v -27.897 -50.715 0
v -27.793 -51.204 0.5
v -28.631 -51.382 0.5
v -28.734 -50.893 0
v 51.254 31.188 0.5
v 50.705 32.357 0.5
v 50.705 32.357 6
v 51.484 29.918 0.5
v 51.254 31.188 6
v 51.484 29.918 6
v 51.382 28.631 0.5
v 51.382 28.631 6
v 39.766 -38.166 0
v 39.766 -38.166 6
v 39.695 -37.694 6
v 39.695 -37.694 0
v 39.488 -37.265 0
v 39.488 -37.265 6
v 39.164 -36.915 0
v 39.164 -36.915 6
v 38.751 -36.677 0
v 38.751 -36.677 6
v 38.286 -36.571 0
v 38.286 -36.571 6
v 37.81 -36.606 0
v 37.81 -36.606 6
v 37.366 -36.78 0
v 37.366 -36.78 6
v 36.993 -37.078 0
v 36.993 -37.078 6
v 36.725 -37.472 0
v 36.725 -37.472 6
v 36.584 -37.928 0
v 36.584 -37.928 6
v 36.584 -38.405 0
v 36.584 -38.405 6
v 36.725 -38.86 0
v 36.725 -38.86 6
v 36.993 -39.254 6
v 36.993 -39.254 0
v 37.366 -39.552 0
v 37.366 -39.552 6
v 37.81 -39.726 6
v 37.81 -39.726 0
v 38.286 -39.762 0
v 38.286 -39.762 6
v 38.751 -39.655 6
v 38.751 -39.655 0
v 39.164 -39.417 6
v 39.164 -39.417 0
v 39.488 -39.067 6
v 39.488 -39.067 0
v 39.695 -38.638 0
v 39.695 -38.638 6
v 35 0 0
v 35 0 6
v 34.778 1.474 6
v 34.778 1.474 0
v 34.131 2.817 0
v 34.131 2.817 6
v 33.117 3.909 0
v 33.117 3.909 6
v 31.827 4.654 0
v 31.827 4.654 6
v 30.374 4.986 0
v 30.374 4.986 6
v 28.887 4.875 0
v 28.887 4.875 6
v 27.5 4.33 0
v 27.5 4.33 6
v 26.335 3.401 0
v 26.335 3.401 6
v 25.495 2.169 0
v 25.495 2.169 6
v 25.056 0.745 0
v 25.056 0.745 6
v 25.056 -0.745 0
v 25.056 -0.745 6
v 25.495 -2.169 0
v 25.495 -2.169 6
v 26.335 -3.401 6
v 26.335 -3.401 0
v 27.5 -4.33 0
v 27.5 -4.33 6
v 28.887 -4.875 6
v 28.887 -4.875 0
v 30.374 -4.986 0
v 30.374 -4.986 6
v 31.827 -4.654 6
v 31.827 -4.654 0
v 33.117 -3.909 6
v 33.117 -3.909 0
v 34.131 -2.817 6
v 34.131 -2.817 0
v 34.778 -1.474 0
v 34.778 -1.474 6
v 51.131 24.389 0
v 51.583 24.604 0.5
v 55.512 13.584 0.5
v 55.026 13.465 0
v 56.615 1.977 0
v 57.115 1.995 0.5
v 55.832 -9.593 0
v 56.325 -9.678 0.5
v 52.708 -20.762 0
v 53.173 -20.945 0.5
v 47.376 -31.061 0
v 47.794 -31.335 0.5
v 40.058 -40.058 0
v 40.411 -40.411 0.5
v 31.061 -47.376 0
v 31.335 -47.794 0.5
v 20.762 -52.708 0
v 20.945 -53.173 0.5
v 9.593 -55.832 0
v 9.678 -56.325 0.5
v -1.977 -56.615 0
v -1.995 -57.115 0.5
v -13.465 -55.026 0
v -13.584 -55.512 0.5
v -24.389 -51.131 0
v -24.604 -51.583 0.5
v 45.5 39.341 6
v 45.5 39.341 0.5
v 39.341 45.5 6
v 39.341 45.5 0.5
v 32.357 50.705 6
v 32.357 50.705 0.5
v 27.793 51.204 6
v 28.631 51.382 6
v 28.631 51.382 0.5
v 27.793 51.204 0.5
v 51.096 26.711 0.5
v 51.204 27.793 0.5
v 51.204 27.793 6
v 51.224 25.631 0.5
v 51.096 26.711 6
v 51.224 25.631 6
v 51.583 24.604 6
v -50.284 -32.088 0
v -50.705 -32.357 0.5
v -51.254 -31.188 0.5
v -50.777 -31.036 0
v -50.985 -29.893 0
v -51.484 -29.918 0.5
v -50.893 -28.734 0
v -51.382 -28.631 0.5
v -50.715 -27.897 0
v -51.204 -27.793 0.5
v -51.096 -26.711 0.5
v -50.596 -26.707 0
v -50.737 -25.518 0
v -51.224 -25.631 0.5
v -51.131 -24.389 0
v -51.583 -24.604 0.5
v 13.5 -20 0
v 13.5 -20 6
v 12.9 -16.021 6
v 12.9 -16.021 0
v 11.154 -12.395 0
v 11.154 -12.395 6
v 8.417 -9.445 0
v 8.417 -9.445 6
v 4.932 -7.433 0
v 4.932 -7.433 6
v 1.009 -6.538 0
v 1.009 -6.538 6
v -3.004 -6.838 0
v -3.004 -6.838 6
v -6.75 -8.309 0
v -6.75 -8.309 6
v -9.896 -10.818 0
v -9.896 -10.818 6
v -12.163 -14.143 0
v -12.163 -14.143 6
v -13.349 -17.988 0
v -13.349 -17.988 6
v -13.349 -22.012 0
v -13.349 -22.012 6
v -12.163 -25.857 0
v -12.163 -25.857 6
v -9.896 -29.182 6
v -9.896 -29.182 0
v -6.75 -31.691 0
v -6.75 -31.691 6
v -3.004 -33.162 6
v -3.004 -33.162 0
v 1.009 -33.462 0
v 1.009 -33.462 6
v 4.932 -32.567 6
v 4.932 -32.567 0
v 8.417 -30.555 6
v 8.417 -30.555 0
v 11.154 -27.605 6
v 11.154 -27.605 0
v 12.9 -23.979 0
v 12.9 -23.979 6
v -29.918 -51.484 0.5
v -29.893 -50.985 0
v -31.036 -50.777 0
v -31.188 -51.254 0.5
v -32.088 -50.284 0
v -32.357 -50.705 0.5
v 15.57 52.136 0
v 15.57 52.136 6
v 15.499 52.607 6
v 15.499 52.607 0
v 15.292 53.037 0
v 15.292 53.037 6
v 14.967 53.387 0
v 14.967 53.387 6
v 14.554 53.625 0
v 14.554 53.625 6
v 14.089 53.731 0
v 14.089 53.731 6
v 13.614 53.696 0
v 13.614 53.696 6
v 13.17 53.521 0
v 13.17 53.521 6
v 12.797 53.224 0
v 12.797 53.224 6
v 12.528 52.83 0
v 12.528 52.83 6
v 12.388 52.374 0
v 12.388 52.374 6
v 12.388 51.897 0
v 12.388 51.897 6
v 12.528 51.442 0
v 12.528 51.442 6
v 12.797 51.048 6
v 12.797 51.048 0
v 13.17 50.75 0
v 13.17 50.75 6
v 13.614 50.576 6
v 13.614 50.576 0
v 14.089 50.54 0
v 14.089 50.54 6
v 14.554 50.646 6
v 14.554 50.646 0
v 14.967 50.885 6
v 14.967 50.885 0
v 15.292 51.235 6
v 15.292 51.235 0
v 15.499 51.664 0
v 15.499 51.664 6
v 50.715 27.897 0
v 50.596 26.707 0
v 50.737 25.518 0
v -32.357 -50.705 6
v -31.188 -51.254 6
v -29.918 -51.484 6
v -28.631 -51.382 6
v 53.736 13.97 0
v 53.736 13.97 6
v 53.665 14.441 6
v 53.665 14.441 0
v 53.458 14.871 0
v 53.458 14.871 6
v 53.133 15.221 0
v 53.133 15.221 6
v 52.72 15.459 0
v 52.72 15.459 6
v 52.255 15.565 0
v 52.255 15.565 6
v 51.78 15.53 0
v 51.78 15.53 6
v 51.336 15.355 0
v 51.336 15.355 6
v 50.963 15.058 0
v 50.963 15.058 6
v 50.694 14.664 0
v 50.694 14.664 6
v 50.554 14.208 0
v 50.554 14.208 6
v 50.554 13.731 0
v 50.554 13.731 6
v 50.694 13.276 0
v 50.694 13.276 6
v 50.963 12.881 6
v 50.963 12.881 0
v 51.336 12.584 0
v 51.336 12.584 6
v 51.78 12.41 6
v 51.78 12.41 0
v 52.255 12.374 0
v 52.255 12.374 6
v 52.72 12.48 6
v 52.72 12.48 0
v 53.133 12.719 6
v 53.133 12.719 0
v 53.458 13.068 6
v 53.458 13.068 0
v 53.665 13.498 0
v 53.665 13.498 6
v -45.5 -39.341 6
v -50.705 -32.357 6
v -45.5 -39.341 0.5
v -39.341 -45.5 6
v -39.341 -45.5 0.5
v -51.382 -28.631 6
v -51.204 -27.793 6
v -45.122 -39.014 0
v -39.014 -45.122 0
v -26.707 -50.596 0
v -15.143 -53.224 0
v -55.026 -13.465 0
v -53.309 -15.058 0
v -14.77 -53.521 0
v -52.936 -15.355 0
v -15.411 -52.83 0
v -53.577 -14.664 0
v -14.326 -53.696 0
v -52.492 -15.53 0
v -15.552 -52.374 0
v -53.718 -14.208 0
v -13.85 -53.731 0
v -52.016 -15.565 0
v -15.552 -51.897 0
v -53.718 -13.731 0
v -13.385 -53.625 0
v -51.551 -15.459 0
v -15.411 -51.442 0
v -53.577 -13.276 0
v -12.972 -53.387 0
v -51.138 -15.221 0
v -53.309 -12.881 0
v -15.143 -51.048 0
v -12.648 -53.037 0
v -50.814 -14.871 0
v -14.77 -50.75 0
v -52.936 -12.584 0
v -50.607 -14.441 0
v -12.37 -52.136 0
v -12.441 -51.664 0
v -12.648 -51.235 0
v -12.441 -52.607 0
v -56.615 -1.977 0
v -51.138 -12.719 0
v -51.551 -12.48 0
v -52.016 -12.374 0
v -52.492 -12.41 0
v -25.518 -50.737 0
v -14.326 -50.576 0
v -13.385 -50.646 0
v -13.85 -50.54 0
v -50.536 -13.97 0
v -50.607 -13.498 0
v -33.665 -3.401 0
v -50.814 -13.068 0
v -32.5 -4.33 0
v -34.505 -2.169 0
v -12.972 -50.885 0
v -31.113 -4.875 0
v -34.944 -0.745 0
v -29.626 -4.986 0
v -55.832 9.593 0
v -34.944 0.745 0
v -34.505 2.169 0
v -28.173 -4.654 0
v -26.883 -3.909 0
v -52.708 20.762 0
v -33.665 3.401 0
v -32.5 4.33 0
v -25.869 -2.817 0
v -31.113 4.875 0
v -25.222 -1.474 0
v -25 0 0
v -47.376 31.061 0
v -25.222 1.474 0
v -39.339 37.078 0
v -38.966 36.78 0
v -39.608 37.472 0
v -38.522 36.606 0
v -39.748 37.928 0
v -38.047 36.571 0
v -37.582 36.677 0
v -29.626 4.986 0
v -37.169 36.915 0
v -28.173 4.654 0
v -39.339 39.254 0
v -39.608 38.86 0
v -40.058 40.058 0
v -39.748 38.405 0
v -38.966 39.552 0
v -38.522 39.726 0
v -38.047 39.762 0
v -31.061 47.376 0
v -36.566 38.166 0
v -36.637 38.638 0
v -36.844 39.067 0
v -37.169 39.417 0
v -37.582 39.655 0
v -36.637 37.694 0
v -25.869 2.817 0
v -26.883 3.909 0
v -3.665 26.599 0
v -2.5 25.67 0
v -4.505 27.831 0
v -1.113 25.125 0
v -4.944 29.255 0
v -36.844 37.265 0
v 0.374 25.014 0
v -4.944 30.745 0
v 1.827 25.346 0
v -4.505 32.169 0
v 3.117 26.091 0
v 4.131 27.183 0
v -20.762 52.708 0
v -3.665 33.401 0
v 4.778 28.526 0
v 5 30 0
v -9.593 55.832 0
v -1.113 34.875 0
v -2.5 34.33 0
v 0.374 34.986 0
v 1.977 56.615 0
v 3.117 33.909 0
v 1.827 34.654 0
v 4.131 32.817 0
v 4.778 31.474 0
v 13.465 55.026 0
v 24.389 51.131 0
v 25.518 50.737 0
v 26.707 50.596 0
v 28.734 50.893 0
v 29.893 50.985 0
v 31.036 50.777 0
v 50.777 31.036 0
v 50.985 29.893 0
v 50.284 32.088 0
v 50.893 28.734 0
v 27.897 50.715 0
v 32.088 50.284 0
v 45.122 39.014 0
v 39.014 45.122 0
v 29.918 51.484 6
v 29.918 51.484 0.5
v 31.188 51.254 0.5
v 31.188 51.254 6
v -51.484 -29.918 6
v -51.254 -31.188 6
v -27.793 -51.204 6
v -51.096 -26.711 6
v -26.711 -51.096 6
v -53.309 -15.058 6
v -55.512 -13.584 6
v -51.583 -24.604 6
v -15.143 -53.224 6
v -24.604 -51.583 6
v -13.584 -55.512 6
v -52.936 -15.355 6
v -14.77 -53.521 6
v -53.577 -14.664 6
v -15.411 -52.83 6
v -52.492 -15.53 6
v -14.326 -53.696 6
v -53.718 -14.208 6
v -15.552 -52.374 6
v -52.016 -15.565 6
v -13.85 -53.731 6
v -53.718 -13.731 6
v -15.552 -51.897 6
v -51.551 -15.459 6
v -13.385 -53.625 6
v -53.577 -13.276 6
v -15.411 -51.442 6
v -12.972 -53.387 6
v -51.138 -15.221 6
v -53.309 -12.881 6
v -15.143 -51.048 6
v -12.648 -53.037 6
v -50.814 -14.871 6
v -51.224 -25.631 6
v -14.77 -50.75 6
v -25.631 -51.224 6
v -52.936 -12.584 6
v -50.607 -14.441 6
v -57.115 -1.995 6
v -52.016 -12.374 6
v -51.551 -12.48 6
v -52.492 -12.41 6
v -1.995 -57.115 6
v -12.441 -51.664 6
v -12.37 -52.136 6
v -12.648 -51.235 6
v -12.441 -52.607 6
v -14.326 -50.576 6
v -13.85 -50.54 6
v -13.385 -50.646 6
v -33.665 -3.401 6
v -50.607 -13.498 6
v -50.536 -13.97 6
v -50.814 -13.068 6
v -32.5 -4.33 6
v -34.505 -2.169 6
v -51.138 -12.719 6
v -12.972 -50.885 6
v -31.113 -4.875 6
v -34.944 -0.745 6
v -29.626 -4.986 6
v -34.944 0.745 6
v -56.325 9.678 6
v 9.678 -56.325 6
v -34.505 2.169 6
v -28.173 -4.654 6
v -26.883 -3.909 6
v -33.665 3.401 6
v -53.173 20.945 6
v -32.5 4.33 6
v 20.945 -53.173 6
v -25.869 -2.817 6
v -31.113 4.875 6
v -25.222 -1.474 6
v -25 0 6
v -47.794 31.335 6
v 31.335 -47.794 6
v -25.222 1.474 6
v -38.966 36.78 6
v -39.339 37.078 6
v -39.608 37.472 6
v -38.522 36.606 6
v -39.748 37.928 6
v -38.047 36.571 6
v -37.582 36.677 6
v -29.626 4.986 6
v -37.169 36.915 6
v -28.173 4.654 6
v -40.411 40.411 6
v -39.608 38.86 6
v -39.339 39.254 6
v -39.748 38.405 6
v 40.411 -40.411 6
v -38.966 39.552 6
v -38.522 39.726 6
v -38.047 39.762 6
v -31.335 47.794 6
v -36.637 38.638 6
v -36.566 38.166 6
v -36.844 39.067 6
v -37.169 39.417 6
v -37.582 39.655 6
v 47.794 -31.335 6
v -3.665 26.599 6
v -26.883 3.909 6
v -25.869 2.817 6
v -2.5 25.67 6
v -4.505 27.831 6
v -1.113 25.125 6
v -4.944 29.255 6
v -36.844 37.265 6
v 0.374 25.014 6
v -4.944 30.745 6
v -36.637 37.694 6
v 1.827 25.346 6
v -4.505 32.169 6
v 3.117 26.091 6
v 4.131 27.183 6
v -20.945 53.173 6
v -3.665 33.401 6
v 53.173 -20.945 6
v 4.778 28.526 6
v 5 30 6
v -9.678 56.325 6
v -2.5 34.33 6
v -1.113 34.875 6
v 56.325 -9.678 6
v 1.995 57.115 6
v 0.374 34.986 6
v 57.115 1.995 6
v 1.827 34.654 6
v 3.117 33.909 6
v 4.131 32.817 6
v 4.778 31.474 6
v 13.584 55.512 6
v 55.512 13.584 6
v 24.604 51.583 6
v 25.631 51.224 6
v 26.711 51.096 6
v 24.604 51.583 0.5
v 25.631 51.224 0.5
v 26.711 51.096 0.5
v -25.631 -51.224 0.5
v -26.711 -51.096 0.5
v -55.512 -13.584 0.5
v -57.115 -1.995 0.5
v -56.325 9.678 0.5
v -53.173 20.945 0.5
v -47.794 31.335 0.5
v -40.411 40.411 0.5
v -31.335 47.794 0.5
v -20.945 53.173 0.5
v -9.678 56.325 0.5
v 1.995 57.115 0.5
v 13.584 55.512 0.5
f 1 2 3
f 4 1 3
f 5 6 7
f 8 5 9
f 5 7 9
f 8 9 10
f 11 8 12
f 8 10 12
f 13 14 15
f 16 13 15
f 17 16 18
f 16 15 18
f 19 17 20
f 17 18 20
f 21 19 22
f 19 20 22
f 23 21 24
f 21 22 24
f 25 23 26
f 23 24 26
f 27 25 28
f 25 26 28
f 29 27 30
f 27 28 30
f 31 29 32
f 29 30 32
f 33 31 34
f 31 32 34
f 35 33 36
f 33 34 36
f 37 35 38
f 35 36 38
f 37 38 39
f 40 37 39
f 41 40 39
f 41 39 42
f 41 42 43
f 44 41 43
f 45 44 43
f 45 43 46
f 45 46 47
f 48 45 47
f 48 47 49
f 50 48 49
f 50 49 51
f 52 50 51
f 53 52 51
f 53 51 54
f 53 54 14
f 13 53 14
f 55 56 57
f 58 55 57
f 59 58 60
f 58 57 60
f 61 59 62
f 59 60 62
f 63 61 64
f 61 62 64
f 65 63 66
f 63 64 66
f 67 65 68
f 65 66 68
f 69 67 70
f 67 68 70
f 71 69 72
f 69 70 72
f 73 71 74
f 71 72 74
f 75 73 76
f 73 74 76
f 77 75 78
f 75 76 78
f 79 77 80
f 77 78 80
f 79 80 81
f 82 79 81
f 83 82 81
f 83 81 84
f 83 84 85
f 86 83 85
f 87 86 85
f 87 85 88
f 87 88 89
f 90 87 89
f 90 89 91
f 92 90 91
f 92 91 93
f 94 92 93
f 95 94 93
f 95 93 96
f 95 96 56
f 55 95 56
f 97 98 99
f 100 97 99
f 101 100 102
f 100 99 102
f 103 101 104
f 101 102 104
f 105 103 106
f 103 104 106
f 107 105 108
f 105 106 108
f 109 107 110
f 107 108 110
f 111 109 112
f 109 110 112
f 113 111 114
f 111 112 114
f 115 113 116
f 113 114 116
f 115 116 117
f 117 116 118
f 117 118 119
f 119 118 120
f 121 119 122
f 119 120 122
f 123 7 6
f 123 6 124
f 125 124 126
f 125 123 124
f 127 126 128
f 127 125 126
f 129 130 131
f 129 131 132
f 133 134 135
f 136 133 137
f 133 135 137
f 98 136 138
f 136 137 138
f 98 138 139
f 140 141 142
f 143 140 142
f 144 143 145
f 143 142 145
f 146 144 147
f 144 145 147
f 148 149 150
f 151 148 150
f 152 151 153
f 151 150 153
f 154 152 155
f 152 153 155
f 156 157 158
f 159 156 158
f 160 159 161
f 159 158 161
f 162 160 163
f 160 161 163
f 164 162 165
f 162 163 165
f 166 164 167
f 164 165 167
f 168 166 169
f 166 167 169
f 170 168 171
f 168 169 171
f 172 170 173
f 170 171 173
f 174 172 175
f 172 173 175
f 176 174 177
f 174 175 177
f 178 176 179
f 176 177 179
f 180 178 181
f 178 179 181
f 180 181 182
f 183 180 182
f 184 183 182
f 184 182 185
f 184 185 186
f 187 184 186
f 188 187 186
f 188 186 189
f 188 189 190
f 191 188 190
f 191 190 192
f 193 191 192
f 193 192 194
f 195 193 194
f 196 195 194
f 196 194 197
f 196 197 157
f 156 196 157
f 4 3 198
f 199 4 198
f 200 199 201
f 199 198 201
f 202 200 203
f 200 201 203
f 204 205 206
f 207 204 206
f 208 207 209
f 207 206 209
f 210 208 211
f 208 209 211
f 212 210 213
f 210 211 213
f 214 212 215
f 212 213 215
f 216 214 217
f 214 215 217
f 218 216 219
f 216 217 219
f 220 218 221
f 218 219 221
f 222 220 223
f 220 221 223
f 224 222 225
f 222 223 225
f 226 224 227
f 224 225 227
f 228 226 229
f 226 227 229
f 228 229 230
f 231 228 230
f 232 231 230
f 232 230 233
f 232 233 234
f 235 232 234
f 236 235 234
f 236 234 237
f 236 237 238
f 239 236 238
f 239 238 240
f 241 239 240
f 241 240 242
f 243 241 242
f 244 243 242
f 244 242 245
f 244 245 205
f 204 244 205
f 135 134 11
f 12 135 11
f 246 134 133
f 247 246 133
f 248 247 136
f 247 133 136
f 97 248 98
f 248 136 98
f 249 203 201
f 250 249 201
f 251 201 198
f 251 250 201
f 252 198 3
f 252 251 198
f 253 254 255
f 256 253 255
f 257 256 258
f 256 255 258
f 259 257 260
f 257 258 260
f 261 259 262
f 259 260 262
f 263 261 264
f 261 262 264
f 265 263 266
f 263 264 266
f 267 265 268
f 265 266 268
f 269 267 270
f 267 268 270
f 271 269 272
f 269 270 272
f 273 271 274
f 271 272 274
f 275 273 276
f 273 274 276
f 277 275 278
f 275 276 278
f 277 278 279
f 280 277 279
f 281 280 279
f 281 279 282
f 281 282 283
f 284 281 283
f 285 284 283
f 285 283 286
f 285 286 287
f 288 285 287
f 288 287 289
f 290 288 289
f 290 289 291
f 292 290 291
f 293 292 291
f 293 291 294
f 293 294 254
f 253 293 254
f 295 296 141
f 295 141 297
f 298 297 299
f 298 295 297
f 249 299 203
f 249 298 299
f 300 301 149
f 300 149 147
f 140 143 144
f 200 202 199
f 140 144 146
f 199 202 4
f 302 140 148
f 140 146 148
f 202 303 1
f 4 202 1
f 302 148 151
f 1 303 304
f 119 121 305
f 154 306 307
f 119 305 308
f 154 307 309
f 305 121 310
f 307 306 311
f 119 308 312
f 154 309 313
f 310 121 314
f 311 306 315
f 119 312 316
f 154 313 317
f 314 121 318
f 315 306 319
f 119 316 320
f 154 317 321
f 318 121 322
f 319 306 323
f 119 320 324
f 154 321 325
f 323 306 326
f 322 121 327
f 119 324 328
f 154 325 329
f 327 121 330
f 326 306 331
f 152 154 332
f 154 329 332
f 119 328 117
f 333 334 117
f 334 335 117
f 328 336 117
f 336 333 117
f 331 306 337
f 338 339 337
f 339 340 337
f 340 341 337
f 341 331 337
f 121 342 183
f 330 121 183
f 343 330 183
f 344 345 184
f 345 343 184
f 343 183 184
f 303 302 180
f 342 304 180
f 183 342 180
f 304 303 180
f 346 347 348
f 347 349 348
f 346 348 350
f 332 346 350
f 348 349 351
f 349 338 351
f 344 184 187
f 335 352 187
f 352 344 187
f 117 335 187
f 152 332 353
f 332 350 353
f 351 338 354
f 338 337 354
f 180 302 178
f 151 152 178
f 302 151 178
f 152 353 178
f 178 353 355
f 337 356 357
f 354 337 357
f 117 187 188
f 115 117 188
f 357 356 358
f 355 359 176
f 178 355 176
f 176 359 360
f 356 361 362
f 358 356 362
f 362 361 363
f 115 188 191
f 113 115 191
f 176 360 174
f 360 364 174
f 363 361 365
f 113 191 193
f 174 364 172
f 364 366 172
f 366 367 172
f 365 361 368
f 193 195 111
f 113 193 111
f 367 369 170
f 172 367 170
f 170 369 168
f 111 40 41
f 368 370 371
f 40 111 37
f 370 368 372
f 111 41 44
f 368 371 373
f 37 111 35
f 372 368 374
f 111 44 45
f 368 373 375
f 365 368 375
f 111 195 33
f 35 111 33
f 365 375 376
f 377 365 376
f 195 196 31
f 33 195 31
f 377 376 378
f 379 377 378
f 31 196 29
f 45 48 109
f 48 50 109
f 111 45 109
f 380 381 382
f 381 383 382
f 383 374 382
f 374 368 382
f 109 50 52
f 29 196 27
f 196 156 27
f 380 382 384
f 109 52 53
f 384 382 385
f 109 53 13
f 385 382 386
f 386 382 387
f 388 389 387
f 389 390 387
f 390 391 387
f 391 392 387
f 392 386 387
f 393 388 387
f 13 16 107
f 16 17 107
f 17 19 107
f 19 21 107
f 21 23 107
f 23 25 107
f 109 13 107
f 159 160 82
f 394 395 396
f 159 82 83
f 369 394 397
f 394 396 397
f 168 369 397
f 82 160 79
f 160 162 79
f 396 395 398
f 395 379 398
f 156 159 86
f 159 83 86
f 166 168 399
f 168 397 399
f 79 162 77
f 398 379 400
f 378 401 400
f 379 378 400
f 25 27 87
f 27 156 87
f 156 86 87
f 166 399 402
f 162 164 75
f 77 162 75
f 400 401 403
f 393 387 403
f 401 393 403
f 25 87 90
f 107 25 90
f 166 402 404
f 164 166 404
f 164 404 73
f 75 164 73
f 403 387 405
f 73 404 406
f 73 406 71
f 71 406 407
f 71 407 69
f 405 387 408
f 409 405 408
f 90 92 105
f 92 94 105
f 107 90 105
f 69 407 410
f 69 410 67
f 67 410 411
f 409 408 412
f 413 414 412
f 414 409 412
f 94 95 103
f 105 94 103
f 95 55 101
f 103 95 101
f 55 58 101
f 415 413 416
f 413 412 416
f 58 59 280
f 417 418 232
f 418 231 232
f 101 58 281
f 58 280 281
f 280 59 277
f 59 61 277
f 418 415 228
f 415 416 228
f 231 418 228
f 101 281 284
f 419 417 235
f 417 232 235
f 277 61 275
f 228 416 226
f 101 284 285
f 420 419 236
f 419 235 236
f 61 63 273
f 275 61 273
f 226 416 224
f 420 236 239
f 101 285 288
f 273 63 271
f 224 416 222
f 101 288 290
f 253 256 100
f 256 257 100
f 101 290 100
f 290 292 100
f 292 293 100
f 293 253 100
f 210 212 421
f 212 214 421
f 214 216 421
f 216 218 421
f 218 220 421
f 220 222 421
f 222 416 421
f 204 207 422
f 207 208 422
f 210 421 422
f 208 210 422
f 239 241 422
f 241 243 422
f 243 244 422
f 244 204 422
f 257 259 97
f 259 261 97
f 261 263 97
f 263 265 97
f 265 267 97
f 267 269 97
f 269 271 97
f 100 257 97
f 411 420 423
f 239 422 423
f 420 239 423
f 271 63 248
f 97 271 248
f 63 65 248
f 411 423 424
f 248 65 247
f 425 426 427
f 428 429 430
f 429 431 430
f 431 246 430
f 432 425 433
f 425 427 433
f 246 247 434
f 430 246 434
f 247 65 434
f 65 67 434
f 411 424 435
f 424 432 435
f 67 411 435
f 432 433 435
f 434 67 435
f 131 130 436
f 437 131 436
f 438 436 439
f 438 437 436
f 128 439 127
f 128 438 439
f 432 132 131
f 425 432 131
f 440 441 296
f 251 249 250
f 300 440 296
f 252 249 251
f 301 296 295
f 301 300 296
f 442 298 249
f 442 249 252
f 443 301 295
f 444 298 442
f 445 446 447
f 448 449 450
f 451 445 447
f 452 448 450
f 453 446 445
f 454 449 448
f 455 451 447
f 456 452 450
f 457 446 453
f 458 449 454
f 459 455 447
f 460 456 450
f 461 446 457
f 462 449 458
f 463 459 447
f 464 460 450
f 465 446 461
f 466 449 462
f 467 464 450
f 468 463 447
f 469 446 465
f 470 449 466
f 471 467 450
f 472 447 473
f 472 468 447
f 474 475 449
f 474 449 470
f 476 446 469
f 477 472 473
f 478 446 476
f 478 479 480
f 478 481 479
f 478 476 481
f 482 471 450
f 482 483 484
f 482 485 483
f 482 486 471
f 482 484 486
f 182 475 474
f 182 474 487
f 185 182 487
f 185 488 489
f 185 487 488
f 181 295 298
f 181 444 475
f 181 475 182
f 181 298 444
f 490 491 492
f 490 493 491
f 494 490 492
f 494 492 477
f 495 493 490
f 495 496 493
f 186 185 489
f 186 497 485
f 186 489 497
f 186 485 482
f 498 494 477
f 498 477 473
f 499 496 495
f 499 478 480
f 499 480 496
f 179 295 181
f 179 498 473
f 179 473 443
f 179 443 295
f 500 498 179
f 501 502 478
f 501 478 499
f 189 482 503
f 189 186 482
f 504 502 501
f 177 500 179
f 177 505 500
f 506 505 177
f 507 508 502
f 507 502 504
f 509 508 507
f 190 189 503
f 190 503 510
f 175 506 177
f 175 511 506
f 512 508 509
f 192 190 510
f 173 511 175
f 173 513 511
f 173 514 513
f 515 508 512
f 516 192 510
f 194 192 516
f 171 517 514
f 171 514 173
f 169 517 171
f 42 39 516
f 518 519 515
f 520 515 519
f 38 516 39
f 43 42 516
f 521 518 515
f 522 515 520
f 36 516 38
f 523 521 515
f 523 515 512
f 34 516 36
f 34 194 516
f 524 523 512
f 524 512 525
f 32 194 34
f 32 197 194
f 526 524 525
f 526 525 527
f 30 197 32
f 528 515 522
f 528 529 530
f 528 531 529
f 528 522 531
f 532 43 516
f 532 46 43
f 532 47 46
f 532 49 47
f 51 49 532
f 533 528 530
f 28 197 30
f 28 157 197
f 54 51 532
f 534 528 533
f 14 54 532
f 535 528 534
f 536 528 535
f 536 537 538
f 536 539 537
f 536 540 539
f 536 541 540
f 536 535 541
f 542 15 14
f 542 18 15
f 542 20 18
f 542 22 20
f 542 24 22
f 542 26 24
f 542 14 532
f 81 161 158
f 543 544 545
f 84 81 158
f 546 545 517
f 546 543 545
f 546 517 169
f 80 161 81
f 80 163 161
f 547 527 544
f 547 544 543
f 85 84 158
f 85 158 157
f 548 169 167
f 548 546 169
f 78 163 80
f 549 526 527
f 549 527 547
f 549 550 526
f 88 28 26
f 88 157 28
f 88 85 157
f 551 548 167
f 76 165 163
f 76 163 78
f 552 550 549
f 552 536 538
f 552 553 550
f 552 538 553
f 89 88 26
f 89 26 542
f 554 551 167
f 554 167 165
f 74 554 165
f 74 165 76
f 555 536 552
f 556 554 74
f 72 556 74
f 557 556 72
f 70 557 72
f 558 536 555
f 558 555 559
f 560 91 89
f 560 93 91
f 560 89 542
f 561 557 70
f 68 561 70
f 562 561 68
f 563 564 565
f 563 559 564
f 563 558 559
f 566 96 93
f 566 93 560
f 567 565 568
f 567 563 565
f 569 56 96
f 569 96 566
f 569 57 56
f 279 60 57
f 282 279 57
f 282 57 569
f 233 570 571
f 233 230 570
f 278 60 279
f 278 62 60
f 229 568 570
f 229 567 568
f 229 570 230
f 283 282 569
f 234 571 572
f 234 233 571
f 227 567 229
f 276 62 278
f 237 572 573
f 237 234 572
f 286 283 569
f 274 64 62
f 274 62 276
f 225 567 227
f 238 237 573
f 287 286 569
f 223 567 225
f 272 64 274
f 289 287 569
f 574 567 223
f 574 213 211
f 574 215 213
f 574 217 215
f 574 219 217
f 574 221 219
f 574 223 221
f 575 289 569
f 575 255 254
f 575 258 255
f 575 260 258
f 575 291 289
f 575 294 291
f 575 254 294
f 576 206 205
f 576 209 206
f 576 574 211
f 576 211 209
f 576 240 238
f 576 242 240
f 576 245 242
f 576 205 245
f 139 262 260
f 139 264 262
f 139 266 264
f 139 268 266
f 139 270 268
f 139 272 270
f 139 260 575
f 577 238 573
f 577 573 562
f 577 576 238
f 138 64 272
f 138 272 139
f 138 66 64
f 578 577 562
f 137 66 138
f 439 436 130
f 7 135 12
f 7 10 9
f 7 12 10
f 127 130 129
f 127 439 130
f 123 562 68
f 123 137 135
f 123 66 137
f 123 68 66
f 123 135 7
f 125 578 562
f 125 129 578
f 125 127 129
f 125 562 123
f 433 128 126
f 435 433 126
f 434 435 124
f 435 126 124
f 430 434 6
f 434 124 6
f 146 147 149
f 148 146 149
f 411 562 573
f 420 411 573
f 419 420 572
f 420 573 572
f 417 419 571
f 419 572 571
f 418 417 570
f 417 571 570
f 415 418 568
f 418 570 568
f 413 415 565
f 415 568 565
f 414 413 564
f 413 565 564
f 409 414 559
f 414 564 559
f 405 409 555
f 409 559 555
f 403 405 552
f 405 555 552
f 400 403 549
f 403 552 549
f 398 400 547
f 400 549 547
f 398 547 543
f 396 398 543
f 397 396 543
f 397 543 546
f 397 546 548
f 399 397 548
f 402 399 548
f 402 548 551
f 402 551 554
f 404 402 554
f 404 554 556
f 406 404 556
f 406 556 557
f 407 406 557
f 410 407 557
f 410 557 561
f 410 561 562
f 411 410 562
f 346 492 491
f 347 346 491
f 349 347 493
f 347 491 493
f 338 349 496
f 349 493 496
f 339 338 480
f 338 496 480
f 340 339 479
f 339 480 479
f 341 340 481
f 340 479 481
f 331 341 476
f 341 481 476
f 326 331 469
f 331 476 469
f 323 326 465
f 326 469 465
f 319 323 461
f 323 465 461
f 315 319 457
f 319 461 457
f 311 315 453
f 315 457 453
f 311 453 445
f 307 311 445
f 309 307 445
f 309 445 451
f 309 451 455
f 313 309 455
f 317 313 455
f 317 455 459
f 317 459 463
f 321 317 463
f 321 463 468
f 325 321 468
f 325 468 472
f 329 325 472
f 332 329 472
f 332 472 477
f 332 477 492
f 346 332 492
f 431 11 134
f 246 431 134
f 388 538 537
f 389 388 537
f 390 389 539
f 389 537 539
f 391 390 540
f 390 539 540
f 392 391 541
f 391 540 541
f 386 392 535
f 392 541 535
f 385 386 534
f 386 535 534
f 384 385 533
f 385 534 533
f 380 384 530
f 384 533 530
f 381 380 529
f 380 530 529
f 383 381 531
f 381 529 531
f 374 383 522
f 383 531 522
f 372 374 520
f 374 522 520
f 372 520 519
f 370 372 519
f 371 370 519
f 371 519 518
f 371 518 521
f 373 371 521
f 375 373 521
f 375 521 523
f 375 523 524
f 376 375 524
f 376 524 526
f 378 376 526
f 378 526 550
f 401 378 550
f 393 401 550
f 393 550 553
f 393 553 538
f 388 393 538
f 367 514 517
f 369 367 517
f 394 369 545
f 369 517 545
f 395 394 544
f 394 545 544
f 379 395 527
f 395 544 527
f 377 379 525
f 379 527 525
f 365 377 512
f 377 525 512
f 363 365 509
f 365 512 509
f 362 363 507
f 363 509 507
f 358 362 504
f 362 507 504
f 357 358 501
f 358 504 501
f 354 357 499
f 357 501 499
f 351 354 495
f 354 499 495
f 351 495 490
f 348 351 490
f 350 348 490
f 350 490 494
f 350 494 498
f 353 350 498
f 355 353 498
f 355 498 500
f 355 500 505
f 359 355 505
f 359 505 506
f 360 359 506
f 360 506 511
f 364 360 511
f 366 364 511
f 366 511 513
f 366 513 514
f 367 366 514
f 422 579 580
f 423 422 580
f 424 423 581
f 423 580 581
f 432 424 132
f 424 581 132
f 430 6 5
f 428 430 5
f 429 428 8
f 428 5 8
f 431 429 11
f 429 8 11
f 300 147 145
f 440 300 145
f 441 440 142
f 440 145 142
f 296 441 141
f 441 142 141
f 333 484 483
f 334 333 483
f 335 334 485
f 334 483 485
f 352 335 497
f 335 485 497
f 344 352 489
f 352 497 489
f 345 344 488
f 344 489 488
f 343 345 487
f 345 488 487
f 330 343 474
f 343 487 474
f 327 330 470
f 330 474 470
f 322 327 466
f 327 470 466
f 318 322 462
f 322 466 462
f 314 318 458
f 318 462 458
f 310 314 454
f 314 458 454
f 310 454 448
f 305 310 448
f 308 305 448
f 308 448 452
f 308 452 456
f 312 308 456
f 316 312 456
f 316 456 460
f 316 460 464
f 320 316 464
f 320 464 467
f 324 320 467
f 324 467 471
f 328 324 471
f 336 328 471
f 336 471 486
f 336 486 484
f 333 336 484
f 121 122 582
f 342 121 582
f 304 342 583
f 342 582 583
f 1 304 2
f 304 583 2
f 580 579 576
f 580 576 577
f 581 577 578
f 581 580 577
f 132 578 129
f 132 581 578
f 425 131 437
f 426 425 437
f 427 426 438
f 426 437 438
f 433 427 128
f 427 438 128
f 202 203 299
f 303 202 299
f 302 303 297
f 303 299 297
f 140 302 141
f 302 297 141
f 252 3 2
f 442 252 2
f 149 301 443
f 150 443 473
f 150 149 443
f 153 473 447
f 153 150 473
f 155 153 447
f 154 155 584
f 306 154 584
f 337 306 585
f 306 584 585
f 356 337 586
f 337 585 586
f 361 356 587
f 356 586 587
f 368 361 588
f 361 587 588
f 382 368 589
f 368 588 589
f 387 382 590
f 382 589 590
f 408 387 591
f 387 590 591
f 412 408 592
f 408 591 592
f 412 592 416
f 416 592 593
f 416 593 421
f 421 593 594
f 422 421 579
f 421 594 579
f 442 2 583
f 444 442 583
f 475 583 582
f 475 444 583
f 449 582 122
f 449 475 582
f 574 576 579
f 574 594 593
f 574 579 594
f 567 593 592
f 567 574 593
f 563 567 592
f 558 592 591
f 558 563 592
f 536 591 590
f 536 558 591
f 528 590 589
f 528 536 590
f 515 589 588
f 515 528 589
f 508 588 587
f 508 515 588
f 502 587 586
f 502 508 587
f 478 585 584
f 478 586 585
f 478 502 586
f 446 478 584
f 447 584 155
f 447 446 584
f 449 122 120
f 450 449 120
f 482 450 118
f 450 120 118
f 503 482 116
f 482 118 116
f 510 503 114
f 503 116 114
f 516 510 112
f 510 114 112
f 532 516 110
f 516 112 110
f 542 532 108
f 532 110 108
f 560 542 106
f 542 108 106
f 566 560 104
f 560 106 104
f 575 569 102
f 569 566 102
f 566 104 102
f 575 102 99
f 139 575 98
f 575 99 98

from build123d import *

# Parameters (mm, degrees)
EXTRUDE_1_DEPTH             = 6
CUT_EXTRUDE_1_DEPTH         = 7
HOLE_WIZARD_M24_1_D         = 27
HOLE_WIZARD_M24_1_DEPTH     = 6
HOLE_WIZARD_10_0_10_1_D     = 10
HOLE_WIZARD_10_0_10_1_DEPTH = 6
HOLE_WIZARD_3_2_3_2_1_D     = 3.2
HOLE_WIZARD_3_2_3_2_1_DEPTH = 6
FILLET_1_R                  = 5
CHAMFER_1_SIZE              = 0.5


with BuildPart() as part:
    # 草图1 → 凸台-拉伸1 (new body)
    with BuildSketch(Plane.XY.offset(6)):
        with BuildLine():
            Line((-50.844308234, -26.095570892), (-51.795328938, -30.582125502))
            ThreePointArc((-51.795328938, -30.582125502), (42.532472888, -42.532472888), (30.582125502, 51.795328938))
            Line((30.582125502, 51.795328938), (26.095570892, 50.844308234))
            ThreePointArc((26.095570892, 50.844308234), (-40.411152545, 40.411152545), (-50.844308234, -26.095570892))
        make_face()
    extrude(amount=-EXTRUDE_1_DEPTH)

    # 草图2 → 切除-拉伸1 (cut, through all)
    with BuildSketch(Plane(origin=(0, 0, 0), x_dir=(-1, 0, 0), z_dir=(0, 0, -1))):
        with BuildLine():
            Line((30.582125502, -51.795328938), (26.095570892, -50.844308234))
            ThreePointArc((26.095570892, -50.844308234), (-40.411152545, -40.411152545), (-50.844308234, 26.095570892))
            Line((-50.844308234, 26.095570892), (-51.795328938, 30.582125502))
            ThreePointArc((-51.795328938, 30.582125502), (-42.532472888, -42.532472888), (30.582125502, -51.795328938))
        make_face()
    extrude(amount=-CUT_EXTRUDE_1_DEPTH, mode=Mode.SUBTRACT)

    # M24 间隙孔1
    with Locations(Plane(origin=(0, 0, 0), x_dir=(-1, 0, 0), z_dir=(0, 0, -1))):
        with Locations((0, -20)):
            Hole(HOLE_WIZARD_M24_1_D / 2, depth=HOLE_WIZARD_M24_1_DEPTH)

    # Ø10.0 (10) 直径孔1
    with Locations(Plane(origin=(0, 0, 0), x_dir=(-1, 0, 0), z_dir=(0, 0, -1))):
        with Locations((0, 30), (-30, 0), (30, 0)):
            Hole(HOLE_WIZARD_10_0_10_1_D / 2, depth=HOLE_WIZARD_10_0_10_1_DEPTH)

    # Ø3.2 (3.2) 直径孔1
    with Locations(Plane(origin=(0, 0, 0), x_dir=(-1, 0, 0), z_dir=(0, 0, -1))):
        with Locations((38.166088515, 38.166088515), (13.969757959, -52.135846474), (-13.969757959, 52.135846474), (-52.135846474, 13.969757959), (-38.166088515, -38.166088515), (52.135846474, -13.969757959)):
            Hole(HOLE_WIZARD_3_2_3_2_1_D / 2, depth=HOLE_WIZARD_3_2_3_2_1_DEPTH)

    # 圆角1
    fillet_1_edges = [part.edges().sort_by_distance(p)[0] for p in [
        (-30.582125502, -51.795328938, 3),
        (51.795328938, 30.582125502, 3),
        (50.844308234, 26.095570892, 3),
        (-26.095570892, -50.844308234, 3),
        (26.095570892, 50.844308234, 3),
        (30.582125502, 51.795328938, 3),
        (-51.795328938, -30.582125502, 3),
        (-50.844308234, -26.095570892, 3),
    ]]
    fillet(fillet_1_edges, radius=FILLET_1_R)

    # 倒角1
    chamfer_1_edges = [part.edges().sort_by_distance(p)[0] for p in [
        (51.409995233, 30.560581919, 0),
        (-30.560581919, -51.409995233, 0),
        (30.560581919, 51.409995233, 0),
        (-26.167497672, -51.130344697, 0),
        (51.130344697, 26.167497672, 0),
        (26.167497672, 51.130344697, 0),
        (-51.130344697, -26.167497672, 0),
        (40.411152545, -40.411152545, 0),
        (-28.212098099, -51.292951206, 0),
        (42.532472888, 42.532472888, 0),
        (28.212098099, 51.292951206, 0),
        (51.292951206, 28.212098099, 0),
        (-42.532472888, -42.532472888, 0),
        (-51.292951206, -28.212098099, 0),
        (-40.411152545, 40.411152545, 0),
        (-51.409995233, -30.560581919, 0),
    ]]
    chamfer(chamfer_1_edges, length=CHAMFER_1_SIZE)


solid = part.part
